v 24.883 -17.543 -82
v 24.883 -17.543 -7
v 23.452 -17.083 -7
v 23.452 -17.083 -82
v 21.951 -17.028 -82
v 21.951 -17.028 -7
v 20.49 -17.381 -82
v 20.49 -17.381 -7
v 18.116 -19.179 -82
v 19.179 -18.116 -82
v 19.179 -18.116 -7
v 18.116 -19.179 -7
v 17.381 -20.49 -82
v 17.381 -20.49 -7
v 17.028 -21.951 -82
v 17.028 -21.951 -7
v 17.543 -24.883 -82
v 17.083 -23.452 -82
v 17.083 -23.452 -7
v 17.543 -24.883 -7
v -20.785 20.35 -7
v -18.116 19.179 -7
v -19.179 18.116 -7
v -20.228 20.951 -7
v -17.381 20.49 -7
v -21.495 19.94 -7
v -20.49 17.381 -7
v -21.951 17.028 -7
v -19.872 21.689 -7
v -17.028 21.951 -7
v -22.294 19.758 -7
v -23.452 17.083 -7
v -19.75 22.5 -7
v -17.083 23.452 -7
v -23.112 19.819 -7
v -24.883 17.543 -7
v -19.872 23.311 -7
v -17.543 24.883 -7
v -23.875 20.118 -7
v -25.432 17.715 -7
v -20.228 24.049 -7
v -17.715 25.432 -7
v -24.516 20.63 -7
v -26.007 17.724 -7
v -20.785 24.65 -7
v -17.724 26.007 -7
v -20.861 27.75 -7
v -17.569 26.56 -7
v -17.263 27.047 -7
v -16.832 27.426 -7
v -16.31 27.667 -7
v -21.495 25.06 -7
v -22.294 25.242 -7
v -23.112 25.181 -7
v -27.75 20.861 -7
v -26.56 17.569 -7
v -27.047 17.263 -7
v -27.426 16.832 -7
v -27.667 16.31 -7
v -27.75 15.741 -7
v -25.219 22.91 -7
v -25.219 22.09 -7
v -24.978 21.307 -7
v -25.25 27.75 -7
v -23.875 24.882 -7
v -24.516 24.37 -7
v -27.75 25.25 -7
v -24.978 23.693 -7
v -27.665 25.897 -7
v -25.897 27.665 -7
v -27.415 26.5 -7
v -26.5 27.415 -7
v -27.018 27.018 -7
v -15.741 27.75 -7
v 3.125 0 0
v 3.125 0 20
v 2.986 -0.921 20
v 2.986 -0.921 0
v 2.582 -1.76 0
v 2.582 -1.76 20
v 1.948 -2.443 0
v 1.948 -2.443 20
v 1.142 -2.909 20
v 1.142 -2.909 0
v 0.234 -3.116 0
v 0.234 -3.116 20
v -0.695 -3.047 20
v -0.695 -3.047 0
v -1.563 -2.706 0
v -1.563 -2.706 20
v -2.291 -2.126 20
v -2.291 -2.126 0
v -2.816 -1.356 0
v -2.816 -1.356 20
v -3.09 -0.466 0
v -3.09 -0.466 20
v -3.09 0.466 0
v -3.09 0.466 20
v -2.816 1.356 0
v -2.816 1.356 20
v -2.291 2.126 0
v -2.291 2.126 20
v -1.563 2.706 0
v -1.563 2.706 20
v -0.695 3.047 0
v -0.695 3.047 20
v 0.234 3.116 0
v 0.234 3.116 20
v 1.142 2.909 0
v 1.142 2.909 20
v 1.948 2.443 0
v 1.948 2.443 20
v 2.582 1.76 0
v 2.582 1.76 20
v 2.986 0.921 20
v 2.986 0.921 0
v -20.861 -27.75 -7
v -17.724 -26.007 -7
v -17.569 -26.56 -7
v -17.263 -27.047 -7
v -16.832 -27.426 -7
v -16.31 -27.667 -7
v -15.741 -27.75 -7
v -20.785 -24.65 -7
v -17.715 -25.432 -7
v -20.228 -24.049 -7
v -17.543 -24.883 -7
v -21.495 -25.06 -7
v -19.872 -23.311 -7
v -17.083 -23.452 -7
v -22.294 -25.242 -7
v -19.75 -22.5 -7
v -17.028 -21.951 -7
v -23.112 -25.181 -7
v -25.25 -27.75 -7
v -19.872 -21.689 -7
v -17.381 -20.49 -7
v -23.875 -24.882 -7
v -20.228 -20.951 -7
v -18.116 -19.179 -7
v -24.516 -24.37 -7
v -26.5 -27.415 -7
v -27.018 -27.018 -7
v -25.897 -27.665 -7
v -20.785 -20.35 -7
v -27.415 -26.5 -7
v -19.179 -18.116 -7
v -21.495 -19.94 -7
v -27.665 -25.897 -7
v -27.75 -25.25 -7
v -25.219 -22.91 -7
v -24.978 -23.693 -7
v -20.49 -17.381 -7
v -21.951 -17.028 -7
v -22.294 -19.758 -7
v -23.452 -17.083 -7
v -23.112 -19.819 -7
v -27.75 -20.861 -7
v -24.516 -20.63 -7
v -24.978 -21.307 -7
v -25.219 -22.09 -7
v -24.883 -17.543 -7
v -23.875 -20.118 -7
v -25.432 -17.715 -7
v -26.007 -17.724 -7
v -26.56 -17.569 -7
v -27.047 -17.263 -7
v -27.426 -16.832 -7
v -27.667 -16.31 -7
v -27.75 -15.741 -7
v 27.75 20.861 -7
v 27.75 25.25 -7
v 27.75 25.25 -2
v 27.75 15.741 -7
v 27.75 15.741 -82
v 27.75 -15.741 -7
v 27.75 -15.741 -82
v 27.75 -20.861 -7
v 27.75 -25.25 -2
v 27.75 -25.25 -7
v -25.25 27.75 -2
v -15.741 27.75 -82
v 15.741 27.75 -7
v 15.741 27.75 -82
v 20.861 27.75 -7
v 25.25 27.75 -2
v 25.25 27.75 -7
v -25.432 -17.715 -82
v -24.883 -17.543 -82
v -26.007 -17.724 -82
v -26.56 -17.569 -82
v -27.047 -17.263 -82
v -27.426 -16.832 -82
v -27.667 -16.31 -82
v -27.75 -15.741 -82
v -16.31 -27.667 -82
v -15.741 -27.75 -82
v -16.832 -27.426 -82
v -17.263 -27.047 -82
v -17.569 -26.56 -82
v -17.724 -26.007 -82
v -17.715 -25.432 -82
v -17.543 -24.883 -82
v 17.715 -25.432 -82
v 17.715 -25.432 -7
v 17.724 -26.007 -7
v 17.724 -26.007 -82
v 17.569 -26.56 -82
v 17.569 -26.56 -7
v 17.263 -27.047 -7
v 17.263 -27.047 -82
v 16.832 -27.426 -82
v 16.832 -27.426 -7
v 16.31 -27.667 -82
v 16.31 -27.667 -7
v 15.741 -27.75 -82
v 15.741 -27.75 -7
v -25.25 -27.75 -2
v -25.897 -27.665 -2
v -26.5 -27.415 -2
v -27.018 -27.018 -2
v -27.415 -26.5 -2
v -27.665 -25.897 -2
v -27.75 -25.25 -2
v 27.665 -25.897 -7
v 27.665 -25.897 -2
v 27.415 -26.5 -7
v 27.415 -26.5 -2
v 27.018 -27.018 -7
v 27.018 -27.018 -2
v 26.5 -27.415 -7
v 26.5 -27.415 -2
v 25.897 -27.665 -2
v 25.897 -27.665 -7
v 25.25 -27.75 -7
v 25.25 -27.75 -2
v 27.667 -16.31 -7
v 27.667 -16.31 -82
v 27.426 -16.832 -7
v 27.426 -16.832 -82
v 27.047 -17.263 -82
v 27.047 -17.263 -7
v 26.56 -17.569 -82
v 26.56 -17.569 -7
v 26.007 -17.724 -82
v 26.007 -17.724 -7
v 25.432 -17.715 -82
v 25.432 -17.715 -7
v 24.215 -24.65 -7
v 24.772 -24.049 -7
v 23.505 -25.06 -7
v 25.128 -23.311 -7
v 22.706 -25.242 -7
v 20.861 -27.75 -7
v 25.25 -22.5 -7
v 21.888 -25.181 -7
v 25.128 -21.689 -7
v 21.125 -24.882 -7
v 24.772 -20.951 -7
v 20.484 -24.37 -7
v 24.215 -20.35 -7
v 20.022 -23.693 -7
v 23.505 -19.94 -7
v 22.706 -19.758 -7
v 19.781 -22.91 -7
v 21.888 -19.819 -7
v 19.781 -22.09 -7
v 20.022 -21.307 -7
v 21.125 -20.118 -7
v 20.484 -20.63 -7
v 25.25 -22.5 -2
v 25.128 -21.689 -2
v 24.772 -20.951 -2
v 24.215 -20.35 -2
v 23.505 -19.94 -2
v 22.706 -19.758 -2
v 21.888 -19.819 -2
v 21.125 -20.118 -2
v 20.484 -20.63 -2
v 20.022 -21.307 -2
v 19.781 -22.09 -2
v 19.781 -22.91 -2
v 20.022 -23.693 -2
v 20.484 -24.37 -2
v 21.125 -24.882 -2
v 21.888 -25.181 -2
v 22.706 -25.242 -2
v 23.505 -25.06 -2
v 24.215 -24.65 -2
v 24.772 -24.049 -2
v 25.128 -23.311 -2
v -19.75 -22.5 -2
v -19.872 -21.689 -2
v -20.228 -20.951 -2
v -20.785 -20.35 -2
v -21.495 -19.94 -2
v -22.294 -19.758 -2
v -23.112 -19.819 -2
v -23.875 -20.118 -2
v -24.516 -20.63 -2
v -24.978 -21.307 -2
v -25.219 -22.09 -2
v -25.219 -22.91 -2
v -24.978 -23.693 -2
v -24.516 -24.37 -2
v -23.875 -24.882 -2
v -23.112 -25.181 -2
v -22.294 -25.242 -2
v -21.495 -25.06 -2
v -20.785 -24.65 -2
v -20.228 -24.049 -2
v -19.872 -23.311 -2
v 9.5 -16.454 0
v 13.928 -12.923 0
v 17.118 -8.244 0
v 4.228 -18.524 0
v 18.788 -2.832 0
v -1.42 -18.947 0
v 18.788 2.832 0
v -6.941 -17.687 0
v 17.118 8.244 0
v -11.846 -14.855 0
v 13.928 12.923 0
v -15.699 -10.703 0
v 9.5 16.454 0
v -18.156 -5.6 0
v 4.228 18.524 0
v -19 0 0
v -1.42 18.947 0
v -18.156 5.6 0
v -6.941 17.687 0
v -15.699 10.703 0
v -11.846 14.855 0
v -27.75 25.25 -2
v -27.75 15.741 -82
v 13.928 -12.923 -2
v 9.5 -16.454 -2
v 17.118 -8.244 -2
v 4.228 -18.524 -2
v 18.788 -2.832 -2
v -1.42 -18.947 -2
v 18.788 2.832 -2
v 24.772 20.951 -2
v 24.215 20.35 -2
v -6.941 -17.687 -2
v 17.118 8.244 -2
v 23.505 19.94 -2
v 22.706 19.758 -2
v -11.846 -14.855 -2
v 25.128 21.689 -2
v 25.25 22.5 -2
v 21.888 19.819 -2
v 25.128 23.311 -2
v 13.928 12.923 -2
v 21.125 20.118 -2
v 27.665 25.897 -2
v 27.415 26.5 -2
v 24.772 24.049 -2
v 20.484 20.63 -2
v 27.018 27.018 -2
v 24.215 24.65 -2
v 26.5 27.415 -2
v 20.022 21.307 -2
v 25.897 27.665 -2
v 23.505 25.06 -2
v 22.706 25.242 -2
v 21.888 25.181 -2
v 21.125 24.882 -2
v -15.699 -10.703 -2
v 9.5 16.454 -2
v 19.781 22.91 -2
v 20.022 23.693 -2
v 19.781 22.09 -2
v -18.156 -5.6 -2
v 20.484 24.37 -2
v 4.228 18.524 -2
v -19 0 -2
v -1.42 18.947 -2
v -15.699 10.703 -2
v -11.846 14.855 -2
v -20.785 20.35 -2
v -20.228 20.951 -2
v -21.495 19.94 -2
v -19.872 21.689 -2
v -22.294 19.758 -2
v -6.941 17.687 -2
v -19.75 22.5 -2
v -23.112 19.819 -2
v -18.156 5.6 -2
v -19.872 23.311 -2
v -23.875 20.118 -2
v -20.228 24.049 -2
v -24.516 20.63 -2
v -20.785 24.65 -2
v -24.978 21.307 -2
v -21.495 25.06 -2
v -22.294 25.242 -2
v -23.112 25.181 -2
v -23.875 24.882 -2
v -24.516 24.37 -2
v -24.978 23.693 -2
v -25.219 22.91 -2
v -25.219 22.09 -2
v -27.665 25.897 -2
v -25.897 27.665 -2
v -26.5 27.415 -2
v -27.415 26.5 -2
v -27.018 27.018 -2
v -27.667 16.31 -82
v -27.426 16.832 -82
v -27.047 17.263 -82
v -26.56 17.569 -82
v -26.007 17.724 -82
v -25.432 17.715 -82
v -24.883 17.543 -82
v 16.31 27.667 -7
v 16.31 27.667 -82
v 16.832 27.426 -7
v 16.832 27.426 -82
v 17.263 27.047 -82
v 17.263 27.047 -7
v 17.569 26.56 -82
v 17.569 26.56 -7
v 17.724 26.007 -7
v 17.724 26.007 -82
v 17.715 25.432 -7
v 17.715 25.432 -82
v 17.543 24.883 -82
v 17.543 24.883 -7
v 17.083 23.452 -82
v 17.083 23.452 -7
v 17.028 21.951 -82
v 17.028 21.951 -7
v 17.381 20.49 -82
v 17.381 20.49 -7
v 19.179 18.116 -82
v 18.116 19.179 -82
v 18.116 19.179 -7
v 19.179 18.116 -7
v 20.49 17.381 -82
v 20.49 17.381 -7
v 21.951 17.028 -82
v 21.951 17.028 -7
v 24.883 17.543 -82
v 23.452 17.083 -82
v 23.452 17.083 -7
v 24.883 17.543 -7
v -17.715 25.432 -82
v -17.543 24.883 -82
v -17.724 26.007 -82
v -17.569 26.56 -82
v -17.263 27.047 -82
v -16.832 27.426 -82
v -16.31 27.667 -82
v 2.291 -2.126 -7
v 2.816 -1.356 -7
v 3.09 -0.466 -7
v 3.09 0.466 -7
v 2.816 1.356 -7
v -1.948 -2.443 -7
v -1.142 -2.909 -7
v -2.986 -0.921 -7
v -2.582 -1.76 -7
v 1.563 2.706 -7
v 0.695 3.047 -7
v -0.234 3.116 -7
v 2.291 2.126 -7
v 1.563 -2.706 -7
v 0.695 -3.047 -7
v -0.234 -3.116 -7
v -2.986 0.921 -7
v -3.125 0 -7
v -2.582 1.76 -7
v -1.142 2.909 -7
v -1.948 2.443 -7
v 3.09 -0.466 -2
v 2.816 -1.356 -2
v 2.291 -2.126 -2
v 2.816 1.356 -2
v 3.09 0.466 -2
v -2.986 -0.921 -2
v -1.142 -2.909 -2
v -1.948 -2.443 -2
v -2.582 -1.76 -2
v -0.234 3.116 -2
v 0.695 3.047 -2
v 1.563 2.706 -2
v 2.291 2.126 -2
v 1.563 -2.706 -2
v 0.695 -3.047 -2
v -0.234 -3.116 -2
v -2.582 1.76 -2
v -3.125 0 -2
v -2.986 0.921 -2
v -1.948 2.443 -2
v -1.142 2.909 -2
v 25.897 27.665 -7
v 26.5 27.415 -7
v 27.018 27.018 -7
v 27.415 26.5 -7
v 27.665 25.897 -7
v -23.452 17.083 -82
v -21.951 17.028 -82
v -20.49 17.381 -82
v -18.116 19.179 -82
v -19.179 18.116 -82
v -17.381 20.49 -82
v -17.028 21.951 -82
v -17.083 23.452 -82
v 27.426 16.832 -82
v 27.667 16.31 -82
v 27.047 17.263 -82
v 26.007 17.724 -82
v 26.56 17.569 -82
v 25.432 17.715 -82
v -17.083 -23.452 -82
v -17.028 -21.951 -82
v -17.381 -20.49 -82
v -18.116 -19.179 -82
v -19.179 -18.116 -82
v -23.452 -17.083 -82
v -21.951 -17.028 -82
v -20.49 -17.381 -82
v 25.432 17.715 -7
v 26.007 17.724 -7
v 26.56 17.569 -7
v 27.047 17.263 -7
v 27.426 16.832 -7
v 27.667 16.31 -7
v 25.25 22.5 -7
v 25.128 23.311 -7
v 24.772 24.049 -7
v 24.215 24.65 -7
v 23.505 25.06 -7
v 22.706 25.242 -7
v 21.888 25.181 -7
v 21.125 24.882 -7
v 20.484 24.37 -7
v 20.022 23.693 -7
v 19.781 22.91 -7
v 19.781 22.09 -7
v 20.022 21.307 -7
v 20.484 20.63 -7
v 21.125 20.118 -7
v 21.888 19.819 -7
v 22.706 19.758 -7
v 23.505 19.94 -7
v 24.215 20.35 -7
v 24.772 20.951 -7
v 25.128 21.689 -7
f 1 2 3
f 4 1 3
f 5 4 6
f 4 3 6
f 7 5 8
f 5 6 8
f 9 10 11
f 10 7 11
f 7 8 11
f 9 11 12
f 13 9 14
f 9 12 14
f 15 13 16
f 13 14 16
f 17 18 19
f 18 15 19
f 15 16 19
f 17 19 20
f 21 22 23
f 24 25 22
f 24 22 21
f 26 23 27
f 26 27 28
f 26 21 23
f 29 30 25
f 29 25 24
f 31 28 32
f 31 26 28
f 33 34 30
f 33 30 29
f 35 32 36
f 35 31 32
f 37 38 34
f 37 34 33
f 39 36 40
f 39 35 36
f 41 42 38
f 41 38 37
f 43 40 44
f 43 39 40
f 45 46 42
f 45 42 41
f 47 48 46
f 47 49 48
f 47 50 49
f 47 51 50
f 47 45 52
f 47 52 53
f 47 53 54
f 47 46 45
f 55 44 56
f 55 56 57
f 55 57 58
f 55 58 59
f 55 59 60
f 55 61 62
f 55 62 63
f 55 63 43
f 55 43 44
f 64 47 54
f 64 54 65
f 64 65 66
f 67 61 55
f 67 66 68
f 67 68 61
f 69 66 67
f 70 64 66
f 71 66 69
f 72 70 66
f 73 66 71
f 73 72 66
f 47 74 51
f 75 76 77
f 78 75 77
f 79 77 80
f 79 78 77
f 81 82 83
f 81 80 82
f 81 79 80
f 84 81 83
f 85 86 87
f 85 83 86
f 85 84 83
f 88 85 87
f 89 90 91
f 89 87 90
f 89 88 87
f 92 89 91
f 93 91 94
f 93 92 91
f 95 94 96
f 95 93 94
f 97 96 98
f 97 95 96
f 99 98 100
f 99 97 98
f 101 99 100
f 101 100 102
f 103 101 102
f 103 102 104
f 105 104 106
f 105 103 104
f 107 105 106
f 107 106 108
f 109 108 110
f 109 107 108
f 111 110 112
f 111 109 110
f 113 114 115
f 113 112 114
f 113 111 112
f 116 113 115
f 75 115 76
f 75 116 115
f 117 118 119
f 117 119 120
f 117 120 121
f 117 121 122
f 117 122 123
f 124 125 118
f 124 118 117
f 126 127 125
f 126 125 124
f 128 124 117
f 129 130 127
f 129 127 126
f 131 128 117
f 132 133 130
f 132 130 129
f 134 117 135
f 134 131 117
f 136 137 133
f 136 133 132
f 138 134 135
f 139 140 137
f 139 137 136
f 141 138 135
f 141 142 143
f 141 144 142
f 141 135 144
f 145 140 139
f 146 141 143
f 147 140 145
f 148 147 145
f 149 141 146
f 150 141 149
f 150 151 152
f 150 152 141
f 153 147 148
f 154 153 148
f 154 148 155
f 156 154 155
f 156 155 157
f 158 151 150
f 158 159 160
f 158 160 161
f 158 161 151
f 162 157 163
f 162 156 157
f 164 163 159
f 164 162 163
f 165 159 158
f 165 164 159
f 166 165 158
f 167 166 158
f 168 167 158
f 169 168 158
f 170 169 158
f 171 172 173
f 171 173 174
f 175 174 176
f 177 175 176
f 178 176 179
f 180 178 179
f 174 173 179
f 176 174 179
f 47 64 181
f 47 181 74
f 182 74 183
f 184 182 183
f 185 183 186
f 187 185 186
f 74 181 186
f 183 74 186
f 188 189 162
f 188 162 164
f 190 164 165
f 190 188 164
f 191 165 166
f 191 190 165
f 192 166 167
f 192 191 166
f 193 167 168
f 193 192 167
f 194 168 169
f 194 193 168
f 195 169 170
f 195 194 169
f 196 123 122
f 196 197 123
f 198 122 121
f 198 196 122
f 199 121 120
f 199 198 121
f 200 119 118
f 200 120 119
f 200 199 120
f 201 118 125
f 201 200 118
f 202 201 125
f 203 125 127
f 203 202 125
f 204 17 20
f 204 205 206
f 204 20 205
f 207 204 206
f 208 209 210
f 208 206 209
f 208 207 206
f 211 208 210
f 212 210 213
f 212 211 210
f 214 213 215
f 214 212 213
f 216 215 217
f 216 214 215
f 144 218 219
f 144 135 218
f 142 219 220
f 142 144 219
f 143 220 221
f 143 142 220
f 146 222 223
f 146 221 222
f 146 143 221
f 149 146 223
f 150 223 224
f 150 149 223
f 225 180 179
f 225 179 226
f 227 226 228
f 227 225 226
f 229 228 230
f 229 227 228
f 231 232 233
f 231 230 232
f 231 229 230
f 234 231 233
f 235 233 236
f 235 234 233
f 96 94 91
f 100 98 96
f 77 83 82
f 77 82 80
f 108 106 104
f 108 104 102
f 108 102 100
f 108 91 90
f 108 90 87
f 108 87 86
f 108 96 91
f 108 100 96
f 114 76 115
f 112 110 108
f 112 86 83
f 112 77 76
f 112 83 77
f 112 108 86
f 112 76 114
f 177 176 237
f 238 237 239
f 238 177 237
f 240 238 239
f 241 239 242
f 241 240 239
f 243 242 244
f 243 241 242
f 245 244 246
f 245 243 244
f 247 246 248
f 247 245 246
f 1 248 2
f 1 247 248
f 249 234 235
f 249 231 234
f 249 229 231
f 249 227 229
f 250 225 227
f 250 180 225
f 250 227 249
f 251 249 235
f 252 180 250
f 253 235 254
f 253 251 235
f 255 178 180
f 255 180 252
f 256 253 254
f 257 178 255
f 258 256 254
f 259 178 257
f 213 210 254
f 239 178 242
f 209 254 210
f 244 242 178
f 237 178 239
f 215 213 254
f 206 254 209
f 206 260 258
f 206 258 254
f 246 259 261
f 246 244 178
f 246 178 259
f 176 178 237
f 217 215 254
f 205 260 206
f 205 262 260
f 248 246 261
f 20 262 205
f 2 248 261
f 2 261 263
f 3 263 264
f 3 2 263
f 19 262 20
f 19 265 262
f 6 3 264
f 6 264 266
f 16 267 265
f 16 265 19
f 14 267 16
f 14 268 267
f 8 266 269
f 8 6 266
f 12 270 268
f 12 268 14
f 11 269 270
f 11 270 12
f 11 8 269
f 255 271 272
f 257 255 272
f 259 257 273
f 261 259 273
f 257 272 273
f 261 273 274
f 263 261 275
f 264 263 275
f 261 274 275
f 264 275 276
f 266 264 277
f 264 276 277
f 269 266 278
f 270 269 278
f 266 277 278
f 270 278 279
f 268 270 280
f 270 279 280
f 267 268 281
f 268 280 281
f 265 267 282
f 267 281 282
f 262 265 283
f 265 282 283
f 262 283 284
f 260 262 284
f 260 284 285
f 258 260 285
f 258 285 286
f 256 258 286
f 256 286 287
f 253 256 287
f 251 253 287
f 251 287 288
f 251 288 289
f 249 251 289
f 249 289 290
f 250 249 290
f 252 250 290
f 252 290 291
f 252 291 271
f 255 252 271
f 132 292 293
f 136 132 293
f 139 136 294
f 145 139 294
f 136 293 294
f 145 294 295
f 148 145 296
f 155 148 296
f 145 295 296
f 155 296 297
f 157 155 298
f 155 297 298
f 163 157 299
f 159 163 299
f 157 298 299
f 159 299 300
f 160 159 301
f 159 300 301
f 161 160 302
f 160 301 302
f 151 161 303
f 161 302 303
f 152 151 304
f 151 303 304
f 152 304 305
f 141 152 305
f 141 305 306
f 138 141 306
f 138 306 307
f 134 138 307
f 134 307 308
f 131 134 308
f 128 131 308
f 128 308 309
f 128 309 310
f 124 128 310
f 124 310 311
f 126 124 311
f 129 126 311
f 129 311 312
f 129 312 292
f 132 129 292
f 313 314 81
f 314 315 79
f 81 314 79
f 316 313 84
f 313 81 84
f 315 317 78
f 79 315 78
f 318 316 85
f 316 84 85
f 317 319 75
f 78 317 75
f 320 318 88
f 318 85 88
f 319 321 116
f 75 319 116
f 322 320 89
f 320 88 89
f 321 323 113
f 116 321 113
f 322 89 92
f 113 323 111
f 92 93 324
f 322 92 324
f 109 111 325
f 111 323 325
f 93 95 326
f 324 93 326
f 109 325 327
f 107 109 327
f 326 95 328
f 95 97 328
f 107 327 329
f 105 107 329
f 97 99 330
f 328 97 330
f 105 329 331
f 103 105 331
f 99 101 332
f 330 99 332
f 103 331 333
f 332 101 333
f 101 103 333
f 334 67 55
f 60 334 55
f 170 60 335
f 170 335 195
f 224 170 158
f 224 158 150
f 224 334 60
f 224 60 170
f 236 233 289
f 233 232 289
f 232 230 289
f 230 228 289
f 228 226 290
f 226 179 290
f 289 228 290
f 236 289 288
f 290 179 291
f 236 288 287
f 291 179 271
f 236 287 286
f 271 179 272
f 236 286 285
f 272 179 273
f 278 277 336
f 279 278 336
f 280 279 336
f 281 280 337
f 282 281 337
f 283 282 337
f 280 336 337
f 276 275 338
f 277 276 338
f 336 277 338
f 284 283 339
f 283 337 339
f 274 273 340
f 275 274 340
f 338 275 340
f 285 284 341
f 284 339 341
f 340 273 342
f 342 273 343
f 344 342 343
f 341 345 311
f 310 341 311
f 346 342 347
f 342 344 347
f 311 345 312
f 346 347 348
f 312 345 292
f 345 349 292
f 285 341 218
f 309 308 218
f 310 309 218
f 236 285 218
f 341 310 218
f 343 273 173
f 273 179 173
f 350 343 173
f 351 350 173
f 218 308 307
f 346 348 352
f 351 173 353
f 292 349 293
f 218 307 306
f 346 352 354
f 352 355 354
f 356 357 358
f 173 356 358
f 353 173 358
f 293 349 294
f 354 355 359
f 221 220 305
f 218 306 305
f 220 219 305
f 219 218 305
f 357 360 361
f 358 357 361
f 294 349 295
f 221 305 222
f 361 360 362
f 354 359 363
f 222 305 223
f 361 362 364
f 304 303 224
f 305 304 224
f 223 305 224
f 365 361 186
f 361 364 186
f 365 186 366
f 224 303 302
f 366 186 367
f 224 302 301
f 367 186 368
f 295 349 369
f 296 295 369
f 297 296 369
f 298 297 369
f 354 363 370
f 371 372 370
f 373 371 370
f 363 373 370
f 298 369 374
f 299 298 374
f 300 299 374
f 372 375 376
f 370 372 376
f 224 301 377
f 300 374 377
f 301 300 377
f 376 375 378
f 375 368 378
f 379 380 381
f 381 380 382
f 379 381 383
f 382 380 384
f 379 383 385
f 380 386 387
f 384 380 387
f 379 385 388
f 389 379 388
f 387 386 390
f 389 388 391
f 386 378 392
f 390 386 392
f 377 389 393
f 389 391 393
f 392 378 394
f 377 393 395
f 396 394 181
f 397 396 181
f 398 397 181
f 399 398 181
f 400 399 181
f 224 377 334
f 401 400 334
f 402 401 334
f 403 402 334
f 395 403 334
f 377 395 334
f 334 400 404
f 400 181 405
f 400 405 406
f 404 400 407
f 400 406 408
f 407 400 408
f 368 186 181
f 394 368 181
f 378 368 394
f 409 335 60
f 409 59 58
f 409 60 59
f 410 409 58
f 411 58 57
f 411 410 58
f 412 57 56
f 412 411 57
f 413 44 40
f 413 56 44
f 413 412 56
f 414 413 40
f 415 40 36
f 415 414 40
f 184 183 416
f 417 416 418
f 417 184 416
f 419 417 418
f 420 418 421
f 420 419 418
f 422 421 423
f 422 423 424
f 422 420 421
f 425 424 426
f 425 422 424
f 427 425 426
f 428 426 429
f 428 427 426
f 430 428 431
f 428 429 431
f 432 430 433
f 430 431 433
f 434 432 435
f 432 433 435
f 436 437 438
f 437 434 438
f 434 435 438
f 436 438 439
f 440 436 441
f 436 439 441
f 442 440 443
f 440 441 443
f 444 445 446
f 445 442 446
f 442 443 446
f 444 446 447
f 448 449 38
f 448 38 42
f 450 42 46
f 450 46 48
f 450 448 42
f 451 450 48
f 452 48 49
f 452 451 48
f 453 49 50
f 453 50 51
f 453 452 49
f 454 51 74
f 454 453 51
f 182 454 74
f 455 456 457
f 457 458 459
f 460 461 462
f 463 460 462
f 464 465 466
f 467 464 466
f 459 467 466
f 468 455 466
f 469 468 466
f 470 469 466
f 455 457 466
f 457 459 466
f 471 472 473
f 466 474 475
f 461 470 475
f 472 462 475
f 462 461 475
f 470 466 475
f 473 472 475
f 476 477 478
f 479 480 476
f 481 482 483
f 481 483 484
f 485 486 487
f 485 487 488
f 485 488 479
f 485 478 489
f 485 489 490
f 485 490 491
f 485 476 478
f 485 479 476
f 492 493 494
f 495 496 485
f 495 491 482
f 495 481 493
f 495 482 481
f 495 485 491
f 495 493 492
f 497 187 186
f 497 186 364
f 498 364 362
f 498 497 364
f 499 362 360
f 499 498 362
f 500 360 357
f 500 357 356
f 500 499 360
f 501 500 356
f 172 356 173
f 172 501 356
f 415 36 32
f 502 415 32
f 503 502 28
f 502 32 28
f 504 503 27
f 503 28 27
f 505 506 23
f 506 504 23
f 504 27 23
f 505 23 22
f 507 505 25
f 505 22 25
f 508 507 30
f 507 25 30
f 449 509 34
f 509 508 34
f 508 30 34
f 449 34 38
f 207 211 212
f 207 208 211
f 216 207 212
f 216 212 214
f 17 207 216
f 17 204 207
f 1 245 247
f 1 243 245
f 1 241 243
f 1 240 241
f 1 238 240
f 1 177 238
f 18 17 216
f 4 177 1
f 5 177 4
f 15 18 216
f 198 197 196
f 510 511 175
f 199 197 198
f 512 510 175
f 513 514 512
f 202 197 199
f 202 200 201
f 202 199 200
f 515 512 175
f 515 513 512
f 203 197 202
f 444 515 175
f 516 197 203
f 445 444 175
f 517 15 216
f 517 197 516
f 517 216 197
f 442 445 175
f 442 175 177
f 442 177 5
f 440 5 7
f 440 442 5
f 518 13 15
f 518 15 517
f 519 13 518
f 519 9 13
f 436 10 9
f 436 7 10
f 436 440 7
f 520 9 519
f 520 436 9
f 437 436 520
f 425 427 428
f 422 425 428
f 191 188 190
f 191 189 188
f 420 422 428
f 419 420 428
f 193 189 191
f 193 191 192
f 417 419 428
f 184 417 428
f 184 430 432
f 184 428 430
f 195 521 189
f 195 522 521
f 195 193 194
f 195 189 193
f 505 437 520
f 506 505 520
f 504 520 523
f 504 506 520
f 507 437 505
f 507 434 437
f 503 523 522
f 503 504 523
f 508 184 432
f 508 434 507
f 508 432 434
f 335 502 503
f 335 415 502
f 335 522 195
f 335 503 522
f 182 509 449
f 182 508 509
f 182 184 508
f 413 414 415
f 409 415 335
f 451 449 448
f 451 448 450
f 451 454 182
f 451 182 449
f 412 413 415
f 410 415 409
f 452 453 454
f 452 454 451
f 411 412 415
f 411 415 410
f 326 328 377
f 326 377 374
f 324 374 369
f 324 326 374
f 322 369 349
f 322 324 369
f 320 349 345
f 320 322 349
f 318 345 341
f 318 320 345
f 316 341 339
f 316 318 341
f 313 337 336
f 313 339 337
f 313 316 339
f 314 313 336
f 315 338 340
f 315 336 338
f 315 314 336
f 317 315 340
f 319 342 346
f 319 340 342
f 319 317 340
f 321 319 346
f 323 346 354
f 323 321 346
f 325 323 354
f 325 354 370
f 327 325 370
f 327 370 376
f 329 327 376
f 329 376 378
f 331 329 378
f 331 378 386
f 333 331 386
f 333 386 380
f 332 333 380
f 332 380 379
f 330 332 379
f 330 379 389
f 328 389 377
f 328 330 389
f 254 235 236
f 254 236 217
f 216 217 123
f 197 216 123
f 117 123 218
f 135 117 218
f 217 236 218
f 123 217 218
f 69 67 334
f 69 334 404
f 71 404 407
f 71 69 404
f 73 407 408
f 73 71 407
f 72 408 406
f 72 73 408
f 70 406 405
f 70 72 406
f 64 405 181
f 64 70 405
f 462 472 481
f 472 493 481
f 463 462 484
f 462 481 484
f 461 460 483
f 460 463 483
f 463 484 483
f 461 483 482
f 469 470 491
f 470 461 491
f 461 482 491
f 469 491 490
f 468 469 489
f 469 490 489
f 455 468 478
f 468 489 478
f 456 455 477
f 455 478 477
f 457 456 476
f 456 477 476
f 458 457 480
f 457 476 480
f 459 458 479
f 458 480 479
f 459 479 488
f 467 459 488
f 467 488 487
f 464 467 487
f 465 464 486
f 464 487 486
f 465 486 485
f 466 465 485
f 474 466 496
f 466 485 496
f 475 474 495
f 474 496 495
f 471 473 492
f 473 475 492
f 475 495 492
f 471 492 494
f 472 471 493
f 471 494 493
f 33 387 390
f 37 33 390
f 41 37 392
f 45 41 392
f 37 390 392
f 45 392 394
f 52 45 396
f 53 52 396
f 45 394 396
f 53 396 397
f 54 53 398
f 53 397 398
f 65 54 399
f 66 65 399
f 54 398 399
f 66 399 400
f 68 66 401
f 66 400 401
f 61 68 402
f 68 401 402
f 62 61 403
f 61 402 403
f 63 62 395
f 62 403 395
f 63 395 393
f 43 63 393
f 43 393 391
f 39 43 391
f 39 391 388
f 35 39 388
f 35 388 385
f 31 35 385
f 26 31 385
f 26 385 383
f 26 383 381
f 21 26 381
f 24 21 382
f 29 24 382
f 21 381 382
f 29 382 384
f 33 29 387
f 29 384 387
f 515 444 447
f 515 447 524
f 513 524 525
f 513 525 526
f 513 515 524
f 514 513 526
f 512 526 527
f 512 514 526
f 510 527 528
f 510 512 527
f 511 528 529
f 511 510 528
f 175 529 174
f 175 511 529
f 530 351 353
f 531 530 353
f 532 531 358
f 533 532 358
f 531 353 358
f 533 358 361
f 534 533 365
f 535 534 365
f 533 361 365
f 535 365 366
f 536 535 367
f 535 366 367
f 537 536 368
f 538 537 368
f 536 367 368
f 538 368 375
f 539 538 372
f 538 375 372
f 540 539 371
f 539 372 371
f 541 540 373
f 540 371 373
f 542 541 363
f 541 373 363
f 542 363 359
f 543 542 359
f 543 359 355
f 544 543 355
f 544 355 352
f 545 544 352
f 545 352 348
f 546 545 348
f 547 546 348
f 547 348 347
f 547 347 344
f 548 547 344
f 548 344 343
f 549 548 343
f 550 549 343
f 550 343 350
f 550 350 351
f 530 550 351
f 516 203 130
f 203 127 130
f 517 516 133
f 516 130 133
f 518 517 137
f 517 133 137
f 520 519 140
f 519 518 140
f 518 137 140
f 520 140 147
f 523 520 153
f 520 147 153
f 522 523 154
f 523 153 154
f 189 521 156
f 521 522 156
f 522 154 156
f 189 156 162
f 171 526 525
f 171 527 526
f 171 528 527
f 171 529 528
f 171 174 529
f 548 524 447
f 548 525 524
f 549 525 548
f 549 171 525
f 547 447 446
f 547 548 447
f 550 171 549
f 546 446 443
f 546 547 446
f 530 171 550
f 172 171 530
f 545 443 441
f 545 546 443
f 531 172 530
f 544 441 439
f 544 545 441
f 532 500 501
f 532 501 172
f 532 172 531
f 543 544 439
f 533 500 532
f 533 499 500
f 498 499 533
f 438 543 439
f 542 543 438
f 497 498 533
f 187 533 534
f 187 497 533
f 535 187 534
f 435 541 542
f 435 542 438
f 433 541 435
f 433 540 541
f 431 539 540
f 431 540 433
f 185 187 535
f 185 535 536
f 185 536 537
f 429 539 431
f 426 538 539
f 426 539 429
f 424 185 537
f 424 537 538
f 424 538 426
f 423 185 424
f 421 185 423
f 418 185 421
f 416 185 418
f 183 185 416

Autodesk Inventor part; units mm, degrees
ref_plane "YZ Plane" through (0, 0, 0) normal (1, 0, 0) x (0, 1, 0)
ref_plane "XZ Plane" through (0, 0, 0) normal (0, 1, 0) x (-1, 0, 0)
ref_plane "XY Plane" through (0, 0, 0) normal (0, 0, 1) x (1, 0, 0)
sketch "Sketch1" plane through (0, 0, 0) normal (0, 0, 1) x (1, 0, 0)
  circle A0 centre (0, 0) radius 3.125
  dimension "d0" = 6.25
extrude "Extrusion1" add sketch "Sketch1" along normal blind 20
sketch "Sketch2" plane through (0, 0, 0) normal (0, 0, -1) x (-1, 0, 0)
  circle A0 centre (0, 0) radius 19
  dimension "d3" = 38
extrude "Extrusion2" add sketch "Sketch2" along normal blind 2
sketch "Sketch3" plane through (0, 0, -2) normal (0, 0, -1) x (-1, 0, 0)
  circle A0 centre (0, 0) radius 3.125 projected
  line L0 (27.75, 27.75) -> (-27.75, 27.75)
  line L1 (-27.75, 27.75) -> (-27.75, -27.75)
  line L2 (-27.75, -27.75) -> (27.75, -27.75)
  line L3 (27.75, -27.75) -> (27.75, 27.75)
  point P0 (27.75, 0)
  point P1 (0, 27.75)
  dimension "d6" = 55.5
extrude "Extrusion3" add sketch "Sketch3" along normal blind 5
fillet "Fillet1" radius 2.5 4 edges at (27.75, 27.75, -4.5) (-27.75, 27.75, -4.5) (-27.75, -27.75, -4.5) (27.75, -27.75, -4.5)
sketch "Sketch4" plane through (0, 0, -2) normal (0, 0, 1) x (1, 0, 0)
  arc A0 (25.25, -27.75) -> (27.75, -25.25) centre (25.25, -25.25) ccw projected
  line L0 (27.75, 25.25) -> (27.75, -25.25) projected
  arc A1 (27.75, 25.25) -> (25.25, 27.75) centre (25.25, 25.25) ccw projected
  line L1 (-25.25, 27.75) -> (25.25, 27.75) projected
  arc A2 (-25.25, 27.75) -> (-27.75, 25.25) centre (-25.25, 25.25) ccw projected
  line L2 (-27.75, -25.25) -> (-27.75, 25.25) projected
  arc A3 (-27.75, -25.25) -> (-25.25, -27.75) centre (-25.25, -25.25) ccw projected
  line L3 (25.25, -27.75) -> (-25.25, -27.75) projected
  circle A4 centre (0, 0) radius 19 projected
  line L4 (-22.5, 22.5) -> (22.5, 22.5) construction
  line L5 (22.5, 22.5) -> (22.5, -22.5) construction
  line L6 (22.5, -22.5) -> (-22.5, -22.5) construction
  line L7 (-22.5, -22.5) -> (-22.5, 22.5) construction
  circle A5 centre (22.5, 22.5) radius 2.75
  circle A6 centre (-22.5, 22.5) radius 2.75
  circle A7 centre (-22.5, -22.5) radius 2.75
  circle A8 centre (22.5, -22.5) radius 2.75
  point P0 (-22.5, 0)
  point P1 (0, 22.5)
  dimension "d10" = 45
  dimension "d11" = 5.5
extrude "Extrusion4" cut sketch "Sketch4" against normal through all contours A5 | A6 | A7 | A8
sketch "Sketch5" plane through (0, 0, -7) normal (0, 0, -1) x (-1, 0, 0)
  circle A0 centre (22.5, -22.5) radius 2.75 construction
  circle A1 centre (-22.5, 22.5) radius 2.75 construction
  circle A2 centre (22.5, 22.5) radius 2.75 construction
  circle A3 centre (-22.5, -22.5) radius 2.75 construction
  arc A4 (-27.75, -25.25) -> (-25.25, -27.75) centre (-25.25, -25.25) ccw construction
  line L0 (-25.25, -27.75) -> (25.25, -27.75) construction
  arc A5 (25.25, -27.75) -> (27.75, -25.25) centre (25.25, -25.25) ccw construction
  line L1 (27.75, -25.25) -> (27.75, 25.25) construction
  arc A6 (27.75, 25.25) -> (25.25, 27.75) centre (25.25, 25.25) ccw construction
  line L2 (25.25, 27.75) -> (-25.25, 27.75) construction
  arc A7 (-25.25, 27.75) -> (-27.75, 25.25) centre (-25.25, 25.25) ccw construction
  line L3 (-27.75, 25.25) -> (-27.75, -25.25) construction
  circle A8 centre (0, 0) radius 3.125 construction
  circle A9 centre (22.5, 22.5) radius 2.75 projected
  arc A10 (20.8606, 27.75) -> (27.75, 20.8606) centre (22.5, 22.5) ccw
  arc A11 (27.75, -20.8606) -> (20.8606, -27.75) centre (22.5, -22.5) ccw
  arc A12 (-20.8606, -27.75) -> (-27.75, -20.8606) centre (-22.5, -22.5) ccw
  arc A13 (-27.75, 20.8606) -> (-20.8606, 27.75) centre (-22.5, 22.5) ccw
  line L4 (27.75, 20.8606) -> (27.75, -20.8606)
  line L5 (20.8606, 27.75) -> (-20.8606, 27.75)
  line L6 (25.25, 27.75) -> (-25.25, 27.75) construction
  line L7 (-27.75, 20.8606) -> (-27.75, -20.8606)
  line L8 (-27.75, 25.25) -> (-27.75, -25.25) construction
  line L9 (-20.8606, -27.75) -> (20.8606, -27.75)
  dimension "d14" = 11
extrude "Extrusion5" add sketch "Sketch5" along normal blind 75 contours A10 L4 A11 L9 A12 L7 A13 L5
fillet "Fillet2" radius 2 8 edges at (20.8606, 27.75, -44.5) (27.75, 20.8606, -44.5) (-20.8606, 27.75, -44.5) (-27.75, 20.8606, -44.5) (20.8606, -27.75, -44.5) (27.75, -20.8606, -44.5) (-20.8606, -27.75, -44.5) (-27.75, -20.8606, -44.5)
properties part number "NEMA23" material "Titanium"
